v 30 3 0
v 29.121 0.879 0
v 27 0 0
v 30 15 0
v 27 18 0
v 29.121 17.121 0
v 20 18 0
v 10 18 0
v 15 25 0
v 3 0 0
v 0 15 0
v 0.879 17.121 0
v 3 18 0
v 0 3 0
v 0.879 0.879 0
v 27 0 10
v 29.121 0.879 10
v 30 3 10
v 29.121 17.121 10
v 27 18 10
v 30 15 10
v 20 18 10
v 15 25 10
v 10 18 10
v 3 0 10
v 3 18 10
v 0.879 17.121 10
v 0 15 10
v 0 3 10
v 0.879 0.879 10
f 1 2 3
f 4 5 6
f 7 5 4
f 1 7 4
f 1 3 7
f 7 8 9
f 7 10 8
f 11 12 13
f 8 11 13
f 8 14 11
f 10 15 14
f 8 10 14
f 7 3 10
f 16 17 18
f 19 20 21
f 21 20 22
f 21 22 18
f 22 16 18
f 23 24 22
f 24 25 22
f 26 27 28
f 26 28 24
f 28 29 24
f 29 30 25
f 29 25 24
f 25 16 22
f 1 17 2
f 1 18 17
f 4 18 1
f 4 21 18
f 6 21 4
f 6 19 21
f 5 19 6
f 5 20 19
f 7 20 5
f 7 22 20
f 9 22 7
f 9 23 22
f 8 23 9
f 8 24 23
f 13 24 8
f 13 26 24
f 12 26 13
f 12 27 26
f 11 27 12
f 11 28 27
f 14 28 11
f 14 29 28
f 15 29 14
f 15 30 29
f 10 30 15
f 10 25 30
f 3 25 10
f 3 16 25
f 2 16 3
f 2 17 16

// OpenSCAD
$fn = 32;

// ----------------------------------------------------------------------
// Ratchet pawl: 30 x 18 mm body, beak 7 mm сверху
// ----------------------------------------------------------------------

// --- parameters (mm) ---
profile_height = 10;      // extrusion height
profile_points = 15;      // points of the closed outline

profile = [[0, 3], [0.879, 0.879], [3, 0], [27, 0], [29.121, 0.879], [30, 3], [30, 15], [29.121, 17.121], [27, 18], [20, 18], [15, 25], [10, 18], [3, 18], [0.879, 17.121], [0, 15]];  // single closed polygon, 15 points, counter clockwise

// --- the one profile operation ---
linear_extrude(height = profile_height) polygon(points = profile);
